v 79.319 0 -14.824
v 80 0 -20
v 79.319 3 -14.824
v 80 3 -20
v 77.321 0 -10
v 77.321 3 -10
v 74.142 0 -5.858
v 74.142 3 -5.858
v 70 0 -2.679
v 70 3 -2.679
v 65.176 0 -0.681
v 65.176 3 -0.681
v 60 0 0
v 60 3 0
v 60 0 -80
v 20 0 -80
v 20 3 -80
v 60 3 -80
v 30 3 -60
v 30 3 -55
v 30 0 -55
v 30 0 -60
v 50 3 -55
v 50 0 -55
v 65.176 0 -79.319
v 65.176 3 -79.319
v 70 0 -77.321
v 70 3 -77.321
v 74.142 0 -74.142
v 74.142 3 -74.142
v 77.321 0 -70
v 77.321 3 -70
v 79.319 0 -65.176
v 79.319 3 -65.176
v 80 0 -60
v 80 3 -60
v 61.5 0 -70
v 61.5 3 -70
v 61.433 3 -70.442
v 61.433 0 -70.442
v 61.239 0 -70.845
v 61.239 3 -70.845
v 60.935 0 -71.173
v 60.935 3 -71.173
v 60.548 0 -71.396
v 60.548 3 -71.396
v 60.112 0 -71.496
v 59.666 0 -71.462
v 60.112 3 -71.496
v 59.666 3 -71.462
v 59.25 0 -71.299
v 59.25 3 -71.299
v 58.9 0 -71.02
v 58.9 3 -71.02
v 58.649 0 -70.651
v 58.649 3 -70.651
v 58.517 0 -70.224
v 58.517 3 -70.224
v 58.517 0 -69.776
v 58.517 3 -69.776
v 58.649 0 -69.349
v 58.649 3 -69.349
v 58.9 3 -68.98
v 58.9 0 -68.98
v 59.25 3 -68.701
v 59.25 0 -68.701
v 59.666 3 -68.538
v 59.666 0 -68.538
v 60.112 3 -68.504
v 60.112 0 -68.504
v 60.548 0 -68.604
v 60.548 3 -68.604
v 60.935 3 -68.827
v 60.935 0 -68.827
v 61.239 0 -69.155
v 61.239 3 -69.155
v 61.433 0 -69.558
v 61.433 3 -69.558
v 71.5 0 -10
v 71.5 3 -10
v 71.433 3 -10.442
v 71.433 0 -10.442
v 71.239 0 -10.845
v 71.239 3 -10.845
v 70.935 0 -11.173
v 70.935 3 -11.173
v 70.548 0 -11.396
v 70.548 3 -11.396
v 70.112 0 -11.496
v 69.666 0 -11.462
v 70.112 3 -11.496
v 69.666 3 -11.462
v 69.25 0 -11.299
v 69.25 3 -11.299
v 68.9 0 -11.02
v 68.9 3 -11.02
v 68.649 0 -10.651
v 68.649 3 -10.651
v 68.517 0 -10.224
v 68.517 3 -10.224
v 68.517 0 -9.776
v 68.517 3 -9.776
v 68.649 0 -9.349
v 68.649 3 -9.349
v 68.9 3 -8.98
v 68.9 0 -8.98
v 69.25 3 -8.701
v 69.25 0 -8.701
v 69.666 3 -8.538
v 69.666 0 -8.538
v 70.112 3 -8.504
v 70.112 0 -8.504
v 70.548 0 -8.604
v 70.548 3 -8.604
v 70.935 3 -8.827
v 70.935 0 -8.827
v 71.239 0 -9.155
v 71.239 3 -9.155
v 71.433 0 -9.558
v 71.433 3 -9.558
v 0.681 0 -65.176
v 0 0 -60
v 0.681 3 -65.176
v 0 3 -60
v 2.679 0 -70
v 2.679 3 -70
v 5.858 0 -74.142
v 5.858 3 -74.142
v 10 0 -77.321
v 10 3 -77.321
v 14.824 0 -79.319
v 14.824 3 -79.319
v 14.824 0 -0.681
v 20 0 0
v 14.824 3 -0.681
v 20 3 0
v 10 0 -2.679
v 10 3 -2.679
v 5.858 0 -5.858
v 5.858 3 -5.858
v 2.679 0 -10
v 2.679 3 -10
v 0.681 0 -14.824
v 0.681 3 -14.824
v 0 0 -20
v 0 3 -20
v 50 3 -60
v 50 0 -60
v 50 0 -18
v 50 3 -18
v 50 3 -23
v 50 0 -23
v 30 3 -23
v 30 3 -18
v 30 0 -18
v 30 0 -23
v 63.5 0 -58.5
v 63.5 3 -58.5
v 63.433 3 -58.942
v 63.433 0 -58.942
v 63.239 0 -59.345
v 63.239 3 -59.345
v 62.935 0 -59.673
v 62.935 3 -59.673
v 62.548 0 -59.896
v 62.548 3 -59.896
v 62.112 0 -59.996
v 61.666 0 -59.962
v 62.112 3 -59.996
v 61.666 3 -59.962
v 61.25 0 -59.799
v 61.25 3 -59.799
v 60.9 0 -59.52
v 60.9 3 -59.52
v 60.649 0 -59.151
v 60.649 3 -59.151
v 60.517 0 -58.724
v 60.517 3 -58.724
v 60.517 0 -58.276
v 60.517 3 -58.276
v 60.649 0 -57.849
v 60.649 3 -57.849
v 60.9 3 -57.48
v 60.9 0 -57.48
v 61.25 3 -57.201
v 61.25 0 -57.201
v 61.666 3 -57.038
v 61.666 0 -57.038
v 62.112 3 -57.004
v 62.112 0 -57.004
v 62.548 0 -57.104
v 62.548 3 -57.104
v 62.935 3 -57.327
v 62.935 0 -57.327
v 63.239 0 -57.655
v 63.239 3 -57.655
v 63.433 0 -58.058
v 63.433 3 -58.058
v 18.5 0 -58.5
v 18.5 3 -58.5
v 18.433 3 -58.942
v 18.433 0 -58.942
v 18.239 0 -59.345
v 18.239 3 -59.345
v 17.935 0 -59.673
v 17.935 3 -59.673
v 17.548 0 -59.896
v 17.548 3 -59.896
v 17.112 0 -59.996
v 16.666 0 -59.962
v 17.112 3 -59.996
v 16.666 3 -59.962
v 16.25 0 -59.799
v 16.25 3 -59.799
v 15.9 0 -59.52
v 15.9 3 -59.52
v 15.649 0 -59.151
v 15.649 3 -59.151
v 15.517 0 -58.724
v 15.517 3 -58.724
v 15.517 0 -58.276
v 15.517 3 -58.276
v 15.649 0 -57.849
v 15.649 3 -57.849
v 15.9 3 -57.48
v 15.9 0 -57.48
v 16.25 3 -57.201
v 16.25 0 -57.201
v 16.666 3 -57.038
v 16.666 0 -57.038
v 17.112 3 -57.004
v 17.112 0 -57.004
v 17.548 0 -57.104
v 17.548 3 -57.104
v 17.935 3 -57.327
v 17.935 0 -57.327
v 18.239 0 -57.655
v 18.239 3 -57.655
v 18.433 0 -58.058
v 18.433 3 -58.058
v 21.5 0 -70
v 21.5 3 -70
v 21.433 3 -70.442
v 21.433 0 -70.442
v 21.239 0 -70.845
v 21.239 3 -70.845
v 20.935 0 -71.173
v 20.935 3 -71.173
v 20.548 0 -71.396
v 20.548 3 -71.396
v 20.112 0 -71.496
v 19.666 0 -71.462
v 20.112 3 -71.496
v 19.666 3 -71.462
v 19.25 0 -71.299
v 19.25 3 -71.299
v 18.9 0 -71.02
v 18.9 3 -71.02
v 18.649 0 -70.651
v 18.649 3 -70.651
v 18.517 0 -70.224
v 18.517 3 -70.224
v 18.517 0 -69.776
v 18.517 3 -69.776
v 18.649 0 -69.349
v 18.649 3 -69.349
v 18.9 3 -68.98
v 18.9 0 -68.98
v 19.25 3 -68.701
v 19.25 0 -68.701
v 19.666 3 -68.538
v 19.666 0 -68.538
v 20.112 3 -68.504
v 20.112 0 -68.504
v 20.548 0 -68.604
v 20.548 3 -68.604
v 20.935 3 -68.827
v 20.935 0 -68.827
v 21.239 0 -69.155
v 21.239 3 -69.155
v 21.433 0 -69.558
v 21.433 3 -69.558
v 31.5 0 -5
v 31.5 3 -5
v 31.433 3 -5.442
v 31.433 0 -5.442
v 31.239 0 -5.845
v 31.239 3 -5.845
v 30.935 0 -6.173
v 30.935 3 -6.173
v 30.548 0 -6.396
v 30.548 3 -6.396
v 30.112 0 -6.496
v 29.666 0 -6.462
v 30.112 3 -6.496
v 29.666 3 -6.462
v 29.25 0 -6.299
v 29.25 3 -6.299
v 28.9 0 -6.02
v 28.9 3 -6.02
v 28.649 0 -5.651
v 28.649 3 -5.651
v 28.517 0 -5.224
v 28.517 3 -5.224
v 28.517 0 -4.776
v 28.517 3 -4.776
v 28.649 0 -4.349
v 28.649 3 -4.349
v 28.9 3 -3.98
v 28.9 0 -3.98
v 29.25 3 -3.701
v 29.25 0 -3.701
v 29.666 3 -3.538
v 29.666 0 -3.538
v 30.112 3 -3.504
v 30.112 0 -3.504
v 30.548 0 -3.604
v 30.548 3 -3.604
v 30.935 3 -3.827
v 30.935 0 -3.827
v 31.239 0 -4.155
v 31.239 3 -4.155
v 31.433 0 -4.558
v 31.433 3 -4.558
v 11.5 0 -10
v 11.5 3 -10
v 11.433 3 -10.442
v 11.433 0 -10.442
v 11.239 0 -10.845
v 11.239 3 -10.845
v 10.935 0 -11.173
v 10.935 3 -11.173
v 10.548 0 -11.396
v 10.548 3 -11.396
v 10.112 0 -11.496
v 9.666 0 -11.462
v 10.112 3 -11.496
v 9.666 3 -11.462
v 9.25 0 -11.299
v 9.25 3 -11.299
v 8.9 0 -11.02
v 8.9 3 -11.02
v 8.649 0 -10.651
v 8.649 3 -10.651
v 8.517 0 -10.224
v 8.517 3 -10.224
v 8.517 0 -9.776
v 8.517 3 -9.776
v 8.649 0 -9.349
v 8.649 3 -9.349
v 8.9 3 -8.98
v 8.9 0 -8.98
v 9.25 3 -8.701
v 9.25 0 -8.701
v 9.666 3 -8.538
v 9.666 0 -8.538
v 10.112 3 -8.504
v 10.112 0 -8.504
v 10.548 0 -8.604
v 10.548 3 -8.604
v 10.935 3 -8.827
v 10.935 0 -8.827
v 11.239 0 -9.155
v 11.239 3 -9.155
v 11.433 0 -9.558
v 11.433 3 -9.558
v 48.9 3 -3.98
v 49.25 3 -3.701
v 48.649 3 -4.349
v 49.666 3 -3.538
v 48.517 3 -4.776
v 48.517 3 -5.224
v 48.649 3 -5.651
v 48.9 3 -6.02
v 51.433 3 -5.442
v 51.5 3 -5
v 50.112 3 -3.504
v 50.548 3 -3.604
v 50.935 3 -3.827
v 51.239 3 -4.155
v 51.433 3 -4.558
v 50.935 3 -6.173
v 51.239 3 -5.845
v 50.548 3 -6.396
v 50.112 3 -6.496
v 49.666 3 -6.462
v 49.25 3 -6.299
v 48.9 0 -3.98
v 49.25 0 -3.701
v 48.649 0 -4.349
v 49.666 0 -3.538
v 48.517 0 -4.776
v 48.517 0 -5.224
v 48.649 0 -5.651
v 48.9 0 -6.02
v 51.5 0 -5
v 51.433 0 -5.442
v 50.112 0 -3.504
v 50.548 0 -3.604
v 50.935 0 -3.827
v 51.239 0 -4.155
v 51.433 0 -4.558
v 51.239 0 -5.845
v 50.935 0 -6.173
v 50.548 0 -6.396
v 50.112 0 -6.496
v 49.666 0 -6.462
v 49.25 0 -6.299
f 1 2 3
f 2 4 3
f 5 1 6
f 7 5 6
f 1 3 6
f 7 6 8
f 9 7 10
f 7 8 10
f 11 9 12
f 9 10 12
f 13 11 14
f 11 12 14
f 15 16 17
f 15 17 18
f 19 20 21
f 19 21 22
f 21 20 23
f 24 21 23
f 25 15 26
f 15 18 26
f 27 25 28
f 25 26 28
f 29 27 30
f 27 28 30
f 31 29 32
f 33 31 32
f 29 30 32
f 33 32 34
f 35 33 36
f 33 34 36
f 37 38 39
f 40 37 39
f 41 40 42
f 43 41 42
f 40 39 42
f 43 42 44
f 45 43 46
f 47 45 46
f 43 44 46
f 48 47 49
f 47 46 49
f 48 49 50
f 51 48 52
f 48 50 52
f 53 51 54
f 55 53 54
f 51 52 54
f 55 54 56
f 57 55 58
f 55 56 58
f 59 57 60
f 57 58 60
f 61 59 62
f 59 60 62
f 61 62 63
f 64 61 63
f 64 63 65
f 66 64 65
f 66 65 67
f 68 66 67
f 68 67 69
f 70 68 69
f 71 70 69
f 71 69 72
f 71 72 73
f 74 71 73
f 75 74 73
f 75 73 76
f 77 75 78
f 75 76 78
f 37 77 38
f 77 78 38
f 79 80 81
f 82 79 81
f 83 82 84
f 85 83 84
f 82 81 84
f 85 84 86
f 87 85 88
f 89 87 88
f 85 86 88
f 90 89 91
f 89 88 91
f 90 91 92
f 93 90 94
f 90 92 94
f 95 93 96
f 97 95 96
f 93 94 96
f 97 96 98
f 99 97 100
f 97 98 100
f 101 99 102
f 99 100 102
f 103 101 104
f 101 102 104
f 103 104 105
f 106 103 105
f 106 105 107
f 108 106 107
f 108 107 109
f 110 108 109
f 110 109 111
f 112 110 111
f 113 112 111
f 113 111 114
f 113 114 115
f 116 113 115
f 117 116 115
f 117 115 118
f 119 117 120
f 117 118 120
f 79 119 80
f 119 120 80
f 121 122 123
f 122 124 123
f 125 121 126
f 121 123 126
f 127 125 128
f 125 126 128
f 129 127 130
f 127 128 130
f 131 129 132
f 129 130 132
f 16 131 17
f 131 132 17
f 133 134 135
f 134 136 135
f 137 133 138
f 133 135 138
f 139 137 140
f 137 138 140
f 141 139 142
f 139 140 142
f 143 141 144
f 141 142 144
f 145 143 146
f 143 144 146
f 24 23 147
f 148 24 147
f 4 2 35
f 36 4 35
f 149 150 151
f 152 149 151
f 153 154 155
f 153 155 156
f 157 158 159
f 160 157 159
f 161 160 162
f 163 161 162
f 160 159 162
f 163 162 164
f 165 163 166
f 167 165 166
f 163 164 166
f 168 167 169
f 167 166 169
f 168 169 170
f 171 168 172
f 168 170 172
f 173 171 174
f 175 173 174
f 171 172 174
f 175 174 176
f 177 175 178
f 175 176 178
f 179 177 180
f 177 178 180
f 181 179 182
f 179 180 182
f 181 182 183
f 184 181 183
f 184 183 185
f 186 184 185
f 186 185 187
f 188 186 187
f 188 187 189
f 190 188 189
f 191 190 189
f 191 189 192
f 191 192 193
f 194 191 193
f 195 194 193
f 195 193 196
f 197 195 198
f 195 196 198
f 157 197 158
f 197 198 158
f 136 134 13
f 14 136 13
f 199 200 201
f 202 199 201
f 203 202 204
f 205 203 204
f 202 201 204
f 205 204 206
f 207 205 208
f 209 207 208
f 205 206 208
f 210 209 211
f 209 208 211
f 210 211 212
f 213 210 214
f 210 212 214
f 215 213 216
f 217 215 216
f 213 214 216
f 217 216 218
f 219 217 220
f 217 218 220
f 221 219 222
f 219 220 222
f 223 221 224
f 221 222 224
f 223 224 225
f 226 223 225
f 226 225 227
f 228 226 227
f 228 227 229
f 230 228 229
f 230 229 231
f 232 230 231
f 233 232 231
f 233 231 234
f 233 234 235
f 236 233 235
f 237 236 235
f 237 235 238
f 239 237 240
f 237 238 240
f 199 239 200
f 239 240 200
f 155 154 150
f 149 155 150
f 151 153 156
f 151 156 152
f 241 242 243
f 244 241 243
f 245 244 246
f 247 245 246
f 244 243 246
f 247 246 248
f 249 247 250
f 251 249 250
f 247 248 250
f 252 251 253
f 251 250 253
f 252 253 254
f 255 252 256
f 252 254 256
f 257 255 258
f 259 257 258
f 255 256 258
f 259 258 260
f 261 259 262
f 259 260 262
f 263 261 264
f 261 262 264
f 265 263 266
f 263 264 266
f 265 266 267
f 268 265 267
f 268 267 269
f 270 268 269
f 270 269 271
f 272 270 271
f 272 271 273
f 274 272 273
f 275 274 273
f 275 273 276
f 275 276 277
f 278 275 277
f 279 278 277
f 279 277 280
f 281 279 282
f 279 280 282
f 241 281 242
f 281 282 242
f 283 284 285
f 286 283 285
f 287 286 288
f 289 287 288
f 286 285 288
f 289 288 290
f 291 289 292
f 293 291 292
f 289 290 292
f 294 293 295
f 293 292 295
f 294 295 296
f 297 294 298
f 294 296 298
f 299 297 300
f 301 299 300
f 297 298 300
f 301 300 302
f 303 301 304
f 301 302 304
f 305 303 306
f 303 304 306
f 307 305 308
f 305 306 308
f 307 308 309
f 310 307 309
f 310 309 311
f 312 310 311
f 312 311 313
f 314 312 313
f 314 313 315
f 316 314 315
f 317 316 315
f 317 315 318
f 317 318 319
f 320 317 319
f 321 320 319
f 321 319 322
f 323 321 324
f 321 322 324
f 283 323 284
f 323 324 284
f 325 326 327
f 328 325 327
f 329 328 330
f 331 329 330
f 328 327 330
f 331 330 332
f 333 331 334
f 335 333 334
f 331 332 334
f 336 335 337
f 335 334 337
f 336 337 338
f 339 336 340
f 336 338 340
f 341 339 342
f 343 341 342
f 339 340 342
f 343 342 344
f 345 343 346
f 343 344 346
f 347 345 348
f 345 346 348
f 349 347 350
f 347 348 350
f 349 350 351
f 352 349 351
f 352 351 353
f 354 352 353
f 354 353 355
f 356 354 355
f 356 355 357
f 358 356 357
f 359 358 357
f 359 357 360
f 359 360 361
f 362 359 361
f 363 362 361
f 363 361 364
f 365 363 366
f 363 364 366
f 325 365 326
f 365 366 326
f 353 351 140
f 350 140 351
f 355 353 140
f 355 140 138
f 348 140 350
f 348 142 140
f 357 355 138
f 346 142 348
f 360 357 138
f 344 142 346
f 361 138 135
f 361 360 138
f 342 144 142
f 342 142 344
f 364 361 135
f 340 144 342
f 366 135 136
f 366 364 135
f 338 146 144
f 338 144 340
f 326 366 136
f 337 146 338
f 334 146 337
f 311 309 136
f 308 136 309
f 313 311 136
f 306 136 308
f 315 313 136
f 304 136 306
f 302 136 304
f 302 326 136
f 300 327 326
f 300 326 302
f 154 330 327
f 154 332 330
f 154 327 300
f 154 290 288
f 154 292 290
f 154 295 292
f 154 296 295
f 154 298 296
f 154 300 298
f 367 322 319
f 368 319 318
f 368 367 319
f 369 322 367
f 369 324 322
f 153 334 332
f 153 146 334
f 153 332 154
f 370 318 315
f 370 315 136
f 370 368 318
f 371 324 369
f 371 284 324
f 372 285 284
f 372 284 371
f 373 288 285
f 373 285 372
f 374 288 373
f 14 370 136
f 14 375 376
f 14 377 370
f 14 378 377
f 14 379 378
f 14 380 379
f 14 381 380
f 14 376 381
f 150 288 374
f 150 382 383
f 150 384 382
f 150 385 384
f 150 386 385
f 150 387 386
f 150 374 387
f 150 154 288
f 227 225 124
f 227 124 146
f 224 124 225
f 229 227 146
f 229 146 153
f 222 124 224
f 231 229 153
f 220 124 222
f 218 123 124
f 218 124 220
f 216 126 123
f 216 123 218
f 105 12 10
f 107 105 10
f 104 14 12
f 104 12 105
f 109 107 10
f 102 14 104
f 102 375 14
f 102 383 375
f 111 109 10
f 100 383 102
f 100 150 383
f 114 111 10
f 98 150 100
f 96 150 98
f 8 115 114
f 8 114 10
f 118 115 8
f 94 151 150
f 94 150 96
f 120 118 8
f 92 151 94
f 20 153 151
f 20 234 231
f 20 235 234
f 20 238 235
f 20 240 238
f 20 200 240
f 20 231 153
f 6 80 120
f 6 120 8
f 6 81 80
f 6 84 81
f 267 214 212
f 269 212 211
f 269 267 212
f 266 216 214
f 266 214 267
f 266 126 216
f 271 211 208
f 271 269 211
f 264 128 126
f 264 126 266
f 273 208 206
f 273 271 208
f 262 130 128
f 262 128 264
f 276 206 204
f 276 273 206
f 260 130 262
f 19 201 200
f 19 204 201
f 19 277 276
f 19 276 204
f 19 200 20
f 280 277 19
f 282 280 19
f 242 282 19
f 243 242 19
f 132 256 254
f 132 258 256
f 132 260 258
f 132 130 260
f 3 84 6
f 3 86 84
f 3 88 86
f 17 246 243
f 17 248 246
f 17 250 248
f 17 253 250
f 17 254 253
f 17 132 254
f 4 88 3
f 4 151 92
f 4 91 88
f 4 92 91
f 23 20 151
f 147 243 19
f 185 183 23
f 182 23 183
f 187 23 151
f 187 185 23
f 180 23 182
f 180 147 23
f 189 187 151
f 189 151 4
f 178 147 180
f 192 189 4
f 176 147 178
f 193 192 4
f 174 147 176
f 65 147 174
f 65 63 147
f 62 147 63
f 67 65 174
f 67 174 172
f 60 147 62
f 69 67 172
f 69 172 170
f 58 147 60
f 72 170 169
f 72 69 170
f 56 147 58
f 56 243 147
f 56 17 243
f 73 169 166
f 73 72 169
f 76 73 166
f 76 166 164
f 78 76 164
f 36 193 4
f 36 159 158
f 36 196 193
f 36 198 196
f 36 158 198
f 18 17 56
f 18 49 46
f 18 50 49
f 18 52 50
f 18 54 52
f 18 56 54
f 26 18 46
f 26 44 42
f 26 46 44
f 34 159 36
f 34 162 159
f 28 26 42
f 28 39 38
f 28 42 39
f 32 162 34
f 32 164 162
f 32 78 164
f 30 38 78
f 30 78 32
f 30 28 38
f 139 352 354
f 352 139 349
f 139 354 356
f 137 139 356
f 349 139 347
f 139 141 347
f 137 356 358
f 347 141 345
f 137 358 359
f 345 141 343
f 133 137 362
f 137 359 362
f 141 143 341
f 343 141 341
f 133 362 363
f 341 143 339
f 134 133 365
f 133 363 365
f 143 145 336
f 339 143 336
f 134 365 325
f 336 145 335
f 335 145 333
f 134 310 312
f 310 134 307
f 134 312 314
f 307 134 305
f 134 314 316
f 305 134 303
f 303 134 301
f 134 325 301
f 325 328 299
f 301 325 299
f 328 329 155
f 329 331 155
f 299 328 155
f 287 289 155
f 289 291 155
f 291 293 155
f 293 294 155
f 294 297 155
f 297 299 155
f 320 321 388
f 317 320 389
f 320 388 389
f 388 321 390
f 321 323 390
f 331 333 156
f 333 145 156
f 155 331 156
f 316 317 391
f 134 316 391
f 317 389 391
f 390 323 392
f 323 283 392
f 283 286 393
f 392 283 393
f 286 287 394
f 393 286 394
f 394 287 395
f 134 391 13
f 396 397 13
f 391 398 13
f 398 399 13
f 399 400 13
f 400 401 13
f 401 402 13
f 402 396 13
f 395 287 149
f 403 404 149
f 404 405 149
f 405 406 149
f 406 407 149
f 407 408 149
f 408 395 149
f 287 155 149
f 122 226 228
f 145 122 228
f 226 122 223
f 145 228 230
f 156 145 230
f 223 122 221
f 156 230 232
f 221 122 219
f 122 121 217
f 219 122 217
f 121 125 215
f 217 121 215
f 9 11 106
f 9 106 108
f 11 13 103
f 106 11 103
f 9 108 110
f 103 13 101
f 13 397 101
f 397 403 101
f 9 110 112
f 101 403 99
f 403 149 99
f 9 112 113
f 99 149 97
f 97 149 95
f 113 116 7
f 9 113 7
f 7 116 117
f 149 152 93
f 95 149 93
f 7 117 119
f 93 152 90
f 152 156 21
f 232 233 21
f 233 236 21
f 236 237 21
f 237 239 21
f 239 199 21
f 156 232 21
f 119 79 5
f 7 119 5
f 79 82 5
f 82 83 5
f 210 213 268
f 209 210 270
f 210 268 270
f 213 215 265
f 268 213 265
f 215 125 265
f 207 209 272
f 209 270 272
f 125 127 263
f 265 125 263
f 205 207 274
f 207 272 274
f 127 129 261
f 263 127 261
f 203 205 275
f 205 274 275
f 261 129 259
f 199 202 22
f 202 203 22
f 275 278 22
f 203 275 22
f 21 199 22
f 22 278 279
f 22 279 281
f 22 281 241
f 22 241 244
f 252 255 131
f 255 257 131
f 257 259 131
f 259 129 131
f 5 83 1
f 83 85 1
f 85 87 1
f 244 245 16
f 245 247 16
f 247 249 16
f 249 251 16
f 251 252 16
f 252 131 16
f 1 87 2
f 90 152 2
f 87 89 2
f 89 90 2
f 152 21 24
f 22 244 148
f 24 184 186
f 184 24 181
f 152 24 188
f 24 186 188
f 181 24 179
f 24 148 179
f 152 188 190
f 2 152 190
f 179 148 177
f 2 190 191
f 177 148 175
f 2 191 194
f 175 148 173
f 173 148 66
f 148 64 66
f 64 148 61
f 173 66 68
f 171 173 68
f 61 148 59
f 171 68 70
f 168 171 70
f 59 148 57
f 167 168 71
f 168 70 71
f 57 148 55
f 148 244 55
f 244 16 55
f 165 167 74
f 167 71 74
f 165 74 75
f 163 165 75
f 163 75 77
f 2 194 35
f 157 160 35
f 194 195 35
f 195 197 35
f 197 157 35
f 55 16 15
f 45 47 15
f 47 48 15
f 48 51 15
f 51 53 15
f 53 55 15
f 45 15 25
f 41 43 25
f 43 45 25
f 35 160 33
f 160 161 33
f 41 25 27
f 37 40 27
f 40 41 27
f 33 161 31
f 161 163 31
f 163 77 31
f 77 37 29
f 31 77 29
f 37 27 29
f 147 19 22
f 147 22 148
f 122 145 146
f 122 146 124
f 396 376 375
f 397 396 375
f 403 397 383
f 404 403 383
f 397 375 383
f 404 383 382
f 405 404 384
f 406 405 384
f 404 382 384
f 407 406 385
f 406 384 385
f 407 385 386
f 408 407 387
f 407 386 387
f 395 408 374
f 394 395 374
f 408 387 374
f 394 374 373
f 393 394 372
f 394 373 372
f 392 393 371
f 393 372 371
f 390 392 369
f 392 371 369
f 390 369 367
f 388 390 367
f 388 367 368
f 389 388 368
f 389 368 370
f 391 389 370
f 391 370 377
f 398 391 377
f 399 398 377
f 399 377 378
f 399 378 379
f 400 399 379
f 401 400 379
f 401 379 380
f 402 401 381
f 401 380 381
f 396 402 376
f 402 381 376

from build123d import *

# Parameters (mm, degrees)
SKETCH3_W           = 80
SKETCH3_H           = 80
BOSS_EXTRUDE1_DEPTH = 3
FILLET3_R           = 20
FILLET4_R           = 20
FILLET5_R           = 20
FILLET6_R           = 20
SKETCH6_R           = 1.5
CUT_EXTRUDE2_DEPTH  = 3
SKETCH9_R           = 1.5
CUT_EXTRUDE3_DEPTH  = 3
SKETCH12_R          = 1.5
CUT_EXTRUDE6_DEPTH  = 3
SKETCH13_R          = 1.5
CUT_EXTRUDE7_DEPTH  = 3
SKETCH14_W          = 20
SKETCH14_H          = 5
CUT_EXTRUDE8_DEPTH  = 10


with BuildPart() as part:
    # Sketch3 → Boss-Extrude1 (new body)
    with BuildSketch(Plane(origin=(0, 0, 0), x_dir=(1, 0, 0), z_dir=(0, 1, 0))):
        with Locations((40, 40)):
            Rectangle(SKETCH3_W, SKETCH3_H)
    extrude(amount=BOSS_EXTRUDE1_DEPTH)

    # Fillet3
    fillet3_edges = [part.edges().sort_by_distance(p)[0] for p in [
        (0, 1.5, -80),
    ]]
    fillet(fillet3_edges, radius=FILLET3_R)

    # Fillet4
    fillet4_edges = [part.edges().sort_by_distance(p)[0] for p in [
        (80, 1.5, -80),
    ]]
    fillet(fillet4_edges, radius=FILLET4_R)

    # Fillet5
    fillet5_edges = [part.edges().sort_by_distance(p)[0] for p in [
        (80, 1.5, 0),
    ]]
    fillet(fillet5_edges, radius=FILLET5_R)

    # Fillet6
    fillet6_edges = [part.edges().sort_by_distance(p)[0] for p in [
        (0, 1.5, 0),
    ]]
    fillet(fillet6_edges, radius=FILLET6_R)

    # Sketch6 → Cut-Extrude2 (cut)
    with BuildSketch(Plane(origin=(0, 3, 0), x_dir=(1, 0, 0), z_dir=(0, 1, 0))):
        with Locations((17, 58.5)):
            Circle(SKETCH6_R)
        with Locations((62, 58.5)):
            Circle(SKETCH6_R)
    extrude(amount=-CUT_EXTRUDE2_DEPTH, mode=Mode.SUBTRACT)

    # Sketch9 → Cut-Extrude3 (cut)
    with BuildSketch(Plane(origin=(0, 3, 0), x_dir=(1, 0, 0), z_dir=(0, 1, 0))):
        with Locations((70, 10)):
            Circle(SKETCH9_R)
        with Locations((10, 10)):
            Circle(SKETCH9_R)
    extrude(amount=-CUT_EXTRUDE3_DEPTH, mode=Mode.SUBTRACT)

    # Sketch12 → Cut-Extrude6 (cut)
    with BuildSketch(Plane(origin=(0, 3, 0), x_dir=(1, 0, 0), z_dir=(0, 1, 0))):
        with Locations((30, 5)):
            Circle(SKETCH12_R)
        with Locations((50, 5)):
            Circle(SKETCH12_R)
    extrude(amount=-CUT_EXTRUDE6_DEPTH, mode=Mode.SUBTRACT)

    # Sketch13 → Cut-Extrude7 (cut)
    with BuildSketch(Plane(origin=(0, 3, 0), x_dir=(1, 0, 0), z_dir=(0, 1, 0))):
        with Locations((20, 70)):
            Circle(SKETCH13_R)
        with Locations((60, 70)):
            Circle(SKETCH13_R)
    extrude(amount=-CUT_EXTRUDE7_DEPTH, mode=Mode.SUBTRACT)

    # Sketch14 → Cut-Extrude8 (cut)
    with BuildSketch(Plane(origin=(0, 3, 0), x_dir=(1, 0, 0), z_dir=(0, 1, 0))):
        with Locations((40, 57.5)):
            Rectangle(SKETCH14_W, SKETCH14_H)
        with Locations((40, 20.5)):
            Rectangle(SKETCH14_W, SKETCH14_H)
    extrude(amount=-CUT_EXTRUDE8_DEPTH, mode=Mode.SUBTRACT)


solid = part.part
